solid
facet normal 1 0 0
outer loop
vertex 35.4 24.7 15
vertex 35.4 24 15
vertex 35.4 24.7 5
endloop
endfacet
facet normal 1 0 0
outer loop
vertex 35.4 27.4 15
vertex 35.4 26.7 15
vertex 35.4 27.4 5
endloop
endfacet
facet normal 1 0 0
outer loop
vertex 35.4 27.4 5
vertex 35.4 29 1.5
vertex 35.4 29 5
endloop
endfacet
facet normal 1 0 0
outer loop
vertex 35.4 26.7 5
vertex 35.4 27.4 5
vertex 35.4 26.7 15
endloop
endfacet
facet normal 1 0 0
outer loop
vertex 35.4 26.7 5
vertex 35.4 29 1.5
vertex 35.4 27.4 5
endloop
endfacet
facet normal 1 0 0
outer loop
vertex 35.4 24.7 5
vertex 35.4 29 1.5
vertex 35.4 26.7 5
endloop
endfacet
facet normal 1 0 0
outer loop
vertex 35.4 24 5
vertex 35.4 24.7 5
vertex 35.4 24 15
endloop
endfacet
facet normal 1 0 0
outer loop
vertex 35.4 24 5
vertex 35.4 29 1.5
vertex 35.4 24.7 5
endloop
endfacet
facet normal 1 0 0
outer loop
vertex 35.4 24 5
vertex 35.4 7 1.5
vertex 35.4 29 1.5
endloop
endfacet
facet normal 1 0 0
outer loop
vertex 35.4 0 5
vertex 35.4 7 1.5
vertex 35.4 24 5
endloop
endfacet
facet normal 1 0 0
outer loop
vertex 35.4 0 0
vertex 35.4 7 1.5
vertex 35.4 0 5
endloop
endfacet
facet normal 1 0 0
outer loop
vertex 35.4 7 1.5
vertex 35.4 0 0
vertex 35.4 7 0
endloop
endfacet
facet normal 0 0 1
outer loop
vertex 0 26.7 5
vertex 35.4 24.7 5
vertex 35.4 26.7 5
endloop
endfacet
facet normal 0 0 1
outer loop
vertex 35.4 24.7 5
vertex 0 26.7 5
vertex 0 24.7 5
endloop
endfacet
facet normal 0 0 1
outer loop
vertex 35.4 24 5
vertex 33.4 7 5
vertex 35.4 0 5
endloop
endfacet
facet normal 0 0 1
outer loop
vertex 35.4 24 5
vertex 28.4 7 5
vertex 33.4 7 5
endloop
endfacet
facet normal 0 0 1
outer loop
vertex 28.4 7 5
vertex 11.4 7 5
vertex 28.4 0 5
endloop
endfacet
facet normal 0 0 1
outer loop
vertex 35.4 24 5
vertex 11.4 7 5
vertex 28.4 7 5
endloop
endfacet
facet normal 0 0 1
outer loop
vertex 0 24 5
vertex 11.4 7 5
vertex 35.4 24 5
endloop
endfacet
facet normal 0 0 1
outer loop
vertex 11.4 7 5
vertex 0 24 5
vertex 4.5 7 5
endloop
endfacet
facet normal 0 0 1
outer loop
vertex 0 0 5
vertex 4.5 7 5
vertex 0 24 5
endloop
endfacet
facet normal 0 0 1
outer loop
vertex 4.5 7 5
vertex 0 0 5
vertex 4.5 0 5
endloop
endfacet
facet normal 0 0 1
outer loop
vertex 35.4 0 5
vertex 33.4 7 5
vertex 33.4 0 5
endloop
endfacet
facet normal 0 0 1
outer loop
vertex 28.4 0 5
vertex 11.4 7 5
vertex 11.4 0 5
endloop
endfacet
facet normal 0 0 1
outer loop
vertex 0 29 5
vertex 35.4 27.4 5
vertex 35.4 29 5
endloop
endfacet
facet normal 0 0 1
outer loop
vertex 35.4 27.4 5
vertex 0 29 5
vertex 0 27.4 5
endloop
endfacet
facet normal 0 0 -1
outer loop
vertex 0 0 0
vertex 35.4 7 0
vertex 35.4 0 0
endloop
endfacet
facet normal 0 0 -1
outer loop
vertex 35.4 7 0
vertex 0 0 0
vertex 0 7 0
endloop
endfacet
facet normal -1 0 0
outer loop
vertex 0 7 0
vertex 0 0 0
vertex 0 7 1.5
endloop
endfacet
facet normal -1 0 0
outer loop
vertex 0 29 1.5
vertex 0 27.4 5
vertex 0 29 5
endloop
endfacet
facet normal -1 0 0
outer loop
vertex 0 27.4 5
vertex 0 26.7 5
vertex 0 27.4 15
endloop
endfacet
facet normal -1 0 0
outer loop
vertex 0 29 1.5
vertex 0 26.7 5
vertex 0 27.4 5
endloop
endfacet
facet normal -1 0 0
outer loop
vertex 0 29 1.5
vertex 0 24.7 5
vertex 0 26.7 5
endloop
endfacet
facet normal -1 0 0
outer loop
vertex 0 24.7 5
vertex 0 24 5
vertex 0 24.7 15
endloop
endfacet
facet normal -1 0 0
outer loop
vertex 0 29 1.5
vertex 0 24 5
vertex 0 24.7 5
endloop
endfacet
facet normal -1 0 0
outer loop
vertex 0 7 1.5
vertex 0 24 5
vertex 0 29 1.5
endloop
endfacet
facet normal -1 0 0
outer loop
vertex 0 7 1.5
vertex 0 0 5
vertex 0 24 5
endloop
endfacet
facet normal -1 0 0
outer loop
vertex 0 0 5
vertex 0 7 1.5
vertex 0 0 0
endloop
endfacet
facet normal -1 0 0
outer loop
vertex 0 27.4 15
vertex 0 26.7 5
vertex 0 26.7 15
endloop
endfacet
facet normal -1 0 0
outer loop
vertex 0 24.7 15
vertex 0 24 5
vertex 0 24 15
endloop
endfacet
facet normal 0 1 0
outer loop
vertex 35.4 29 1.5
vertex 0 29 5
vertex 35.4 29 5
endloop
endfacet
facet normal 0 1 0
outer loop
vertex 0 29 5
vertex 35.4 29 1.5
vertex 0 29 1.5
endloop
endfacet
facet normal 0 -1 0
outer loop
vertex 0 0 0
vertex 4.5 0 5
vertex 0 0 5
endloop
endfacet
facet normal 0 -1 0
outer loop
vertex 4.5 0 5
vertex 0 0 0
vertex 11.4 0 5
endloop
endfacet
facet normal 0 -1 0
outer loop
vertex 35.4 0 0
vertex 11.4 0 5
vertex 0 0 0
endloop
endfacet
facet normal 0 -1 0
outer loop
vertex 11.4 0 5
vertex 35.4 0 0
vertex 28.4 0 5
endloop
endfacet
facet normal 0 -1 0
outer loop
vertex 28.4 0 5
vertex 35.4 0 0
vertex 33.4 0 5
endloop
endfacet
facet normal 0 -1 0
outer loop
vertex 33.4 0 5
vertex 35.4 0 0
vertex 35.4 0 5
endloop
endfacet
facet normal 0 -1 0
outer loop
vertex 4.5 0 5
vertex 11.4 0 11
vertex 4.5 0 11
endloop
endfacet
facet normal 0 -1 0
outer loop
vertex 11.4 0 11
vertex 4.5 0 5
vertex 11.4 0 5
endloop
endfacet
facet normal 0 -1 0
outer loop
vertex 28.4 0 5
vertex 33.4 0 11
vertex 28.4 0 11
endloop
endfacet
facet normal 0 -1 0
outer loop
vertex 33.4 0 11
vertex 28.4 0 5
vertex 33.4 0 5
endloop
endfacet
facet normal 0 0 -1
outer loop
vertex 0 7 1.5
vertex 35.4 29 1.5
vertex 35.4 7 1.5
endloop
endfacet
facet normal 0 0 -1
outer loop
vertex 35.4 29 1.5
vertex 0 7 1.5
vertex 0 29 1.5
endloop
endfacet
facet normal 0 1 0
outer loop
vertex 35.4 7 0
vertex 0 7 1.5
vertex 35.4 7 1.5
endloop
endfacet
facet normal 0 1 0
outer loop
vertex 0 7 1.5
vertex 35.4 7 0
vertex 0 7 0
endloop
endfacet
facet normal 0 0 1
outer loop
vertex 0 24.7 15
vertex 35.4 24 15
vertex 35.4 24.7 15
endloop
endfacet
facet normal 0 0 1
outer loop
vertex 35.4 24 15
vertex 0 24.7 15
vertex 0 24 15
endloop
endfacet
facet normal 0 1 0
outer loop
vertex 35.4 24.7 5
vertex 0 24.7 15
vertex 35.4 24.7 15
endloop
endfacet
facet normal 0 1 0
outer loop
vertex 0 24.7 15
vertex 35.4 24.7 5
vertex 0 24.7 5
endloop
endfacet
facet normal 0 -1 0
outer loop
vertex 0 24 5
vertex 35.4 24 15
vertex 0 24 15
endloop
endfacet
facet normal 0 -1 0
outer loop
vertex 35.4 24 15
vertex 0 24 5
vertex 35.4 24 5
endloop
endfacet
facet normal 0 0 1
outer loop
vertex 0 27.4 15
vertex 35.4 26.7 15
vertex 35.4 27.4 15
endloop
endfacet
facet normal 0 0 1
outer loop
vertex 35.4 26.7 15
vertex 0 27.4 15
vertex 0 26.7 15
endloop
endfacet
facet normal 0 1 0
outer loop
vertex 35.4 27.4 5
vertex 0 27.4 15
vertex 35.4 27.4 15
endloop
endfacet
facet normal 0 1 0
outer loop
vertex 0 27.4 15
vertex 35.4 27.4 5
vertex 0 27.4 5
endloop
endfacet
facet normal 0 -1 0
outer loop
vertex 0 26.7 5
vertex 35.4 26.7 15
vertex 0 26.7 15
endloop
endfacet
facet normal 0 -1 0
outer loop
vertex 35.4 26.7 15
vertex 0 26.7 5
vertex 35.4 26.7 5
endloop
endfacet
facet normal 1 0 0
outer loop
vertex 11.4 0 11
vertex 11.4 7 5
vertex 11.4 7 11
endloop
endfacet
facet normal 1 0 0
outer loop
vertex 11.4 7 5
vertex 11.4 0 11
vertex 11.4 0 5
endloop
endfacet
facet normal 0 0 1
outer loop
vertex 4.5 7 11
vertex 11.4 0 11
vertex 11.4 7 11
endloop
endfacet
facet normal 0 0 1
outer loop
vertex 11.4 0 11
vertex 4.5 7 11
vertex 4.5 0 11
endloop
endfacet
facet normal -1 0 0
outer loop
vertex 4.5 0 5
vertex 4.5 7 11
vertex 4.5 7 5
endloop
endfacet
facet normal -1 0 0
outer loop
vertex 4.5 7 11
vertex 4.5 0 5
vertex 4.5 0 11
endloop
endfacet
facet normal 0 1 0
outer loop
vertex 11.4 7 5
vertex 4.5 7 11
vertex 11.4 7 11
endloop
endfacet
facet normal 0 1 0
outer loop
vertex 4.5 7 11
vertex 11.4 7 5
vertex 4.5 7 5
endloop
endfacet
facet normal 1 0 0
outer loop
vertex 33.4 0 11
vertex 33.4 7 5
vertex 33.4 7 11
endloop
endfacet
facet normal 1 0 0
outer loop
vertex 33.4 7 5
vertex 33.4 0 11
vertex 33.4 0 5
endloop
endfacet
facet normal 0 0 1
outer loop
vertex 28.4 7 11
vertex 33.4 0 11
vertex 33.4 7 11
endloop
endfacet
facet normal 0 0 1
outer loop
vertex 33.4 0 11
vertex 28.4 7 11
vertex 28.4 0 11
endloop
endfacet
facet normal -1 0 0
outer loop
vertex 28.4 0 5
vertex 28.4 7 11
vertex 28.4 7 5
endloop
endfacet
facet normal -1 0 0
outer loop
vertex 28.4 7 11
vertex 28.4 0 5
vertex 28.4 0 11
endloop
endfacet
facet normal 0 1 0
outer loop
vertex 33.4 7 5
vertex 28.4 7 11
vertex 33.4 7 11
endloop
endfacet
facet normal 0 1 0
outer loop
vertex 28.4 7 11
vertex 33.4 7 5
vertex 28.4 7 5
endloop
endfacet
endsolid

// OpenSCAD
railWidth=36 - 0.6;
railDepth=10;
railHeight=5;
contactorWallWidth=2;

leftVoidOffset=4.5;
leftVoidWidth=7 - 0.1;
leftVoidDepth=7;
leftVoidHeight=6;

rightVoidOffset = 2;
rightVoidWidth = 5;
rightVoidHeight = leftVoidHeight;
rightVoidDepth = 7;

railEndToLidEdge = contactorWallWidth + 17;

clampOffset = leftVoidDepth + contactorWallWidth + 15;
clampDepth = 2;
clampHeight = 10;
clampWallSize = 1 - 0.3;

lidLipHeight = 1.5;

maxVoidDepth = max(rightVoidDepth, leftVoidDepth);

difference() {
    cube([railWidth, railDepth + railEndToLidEdge, railHeight]);
    translate([0, maxVoidDepth,0]) {
        cube([railWidth, railDepth + railEndToLidEdge - maxVoidDepth, lidLipHeight]); 
    }
}
translate([leftVoidOffset,0,railHeight]) {
    cube([leftVoidWidth, leftVoidDepth, leftVoidHeight]);
}

translate([railWidth - rightVoidOffset - rightVoidWidth,0,railHeight]) {
    cube([rightVoidWidth, rightVoidDepth, rightVoidHeight]);
}


translate([0, clampOffset, railHeight]) {
    cube([railWidth, clampWallSize, clampHeight]);
    translate([0, clampWallSize + clampDepth, 0]) {
        cube([railWidth, clampWallSize, clampHeight]);
    }
}
